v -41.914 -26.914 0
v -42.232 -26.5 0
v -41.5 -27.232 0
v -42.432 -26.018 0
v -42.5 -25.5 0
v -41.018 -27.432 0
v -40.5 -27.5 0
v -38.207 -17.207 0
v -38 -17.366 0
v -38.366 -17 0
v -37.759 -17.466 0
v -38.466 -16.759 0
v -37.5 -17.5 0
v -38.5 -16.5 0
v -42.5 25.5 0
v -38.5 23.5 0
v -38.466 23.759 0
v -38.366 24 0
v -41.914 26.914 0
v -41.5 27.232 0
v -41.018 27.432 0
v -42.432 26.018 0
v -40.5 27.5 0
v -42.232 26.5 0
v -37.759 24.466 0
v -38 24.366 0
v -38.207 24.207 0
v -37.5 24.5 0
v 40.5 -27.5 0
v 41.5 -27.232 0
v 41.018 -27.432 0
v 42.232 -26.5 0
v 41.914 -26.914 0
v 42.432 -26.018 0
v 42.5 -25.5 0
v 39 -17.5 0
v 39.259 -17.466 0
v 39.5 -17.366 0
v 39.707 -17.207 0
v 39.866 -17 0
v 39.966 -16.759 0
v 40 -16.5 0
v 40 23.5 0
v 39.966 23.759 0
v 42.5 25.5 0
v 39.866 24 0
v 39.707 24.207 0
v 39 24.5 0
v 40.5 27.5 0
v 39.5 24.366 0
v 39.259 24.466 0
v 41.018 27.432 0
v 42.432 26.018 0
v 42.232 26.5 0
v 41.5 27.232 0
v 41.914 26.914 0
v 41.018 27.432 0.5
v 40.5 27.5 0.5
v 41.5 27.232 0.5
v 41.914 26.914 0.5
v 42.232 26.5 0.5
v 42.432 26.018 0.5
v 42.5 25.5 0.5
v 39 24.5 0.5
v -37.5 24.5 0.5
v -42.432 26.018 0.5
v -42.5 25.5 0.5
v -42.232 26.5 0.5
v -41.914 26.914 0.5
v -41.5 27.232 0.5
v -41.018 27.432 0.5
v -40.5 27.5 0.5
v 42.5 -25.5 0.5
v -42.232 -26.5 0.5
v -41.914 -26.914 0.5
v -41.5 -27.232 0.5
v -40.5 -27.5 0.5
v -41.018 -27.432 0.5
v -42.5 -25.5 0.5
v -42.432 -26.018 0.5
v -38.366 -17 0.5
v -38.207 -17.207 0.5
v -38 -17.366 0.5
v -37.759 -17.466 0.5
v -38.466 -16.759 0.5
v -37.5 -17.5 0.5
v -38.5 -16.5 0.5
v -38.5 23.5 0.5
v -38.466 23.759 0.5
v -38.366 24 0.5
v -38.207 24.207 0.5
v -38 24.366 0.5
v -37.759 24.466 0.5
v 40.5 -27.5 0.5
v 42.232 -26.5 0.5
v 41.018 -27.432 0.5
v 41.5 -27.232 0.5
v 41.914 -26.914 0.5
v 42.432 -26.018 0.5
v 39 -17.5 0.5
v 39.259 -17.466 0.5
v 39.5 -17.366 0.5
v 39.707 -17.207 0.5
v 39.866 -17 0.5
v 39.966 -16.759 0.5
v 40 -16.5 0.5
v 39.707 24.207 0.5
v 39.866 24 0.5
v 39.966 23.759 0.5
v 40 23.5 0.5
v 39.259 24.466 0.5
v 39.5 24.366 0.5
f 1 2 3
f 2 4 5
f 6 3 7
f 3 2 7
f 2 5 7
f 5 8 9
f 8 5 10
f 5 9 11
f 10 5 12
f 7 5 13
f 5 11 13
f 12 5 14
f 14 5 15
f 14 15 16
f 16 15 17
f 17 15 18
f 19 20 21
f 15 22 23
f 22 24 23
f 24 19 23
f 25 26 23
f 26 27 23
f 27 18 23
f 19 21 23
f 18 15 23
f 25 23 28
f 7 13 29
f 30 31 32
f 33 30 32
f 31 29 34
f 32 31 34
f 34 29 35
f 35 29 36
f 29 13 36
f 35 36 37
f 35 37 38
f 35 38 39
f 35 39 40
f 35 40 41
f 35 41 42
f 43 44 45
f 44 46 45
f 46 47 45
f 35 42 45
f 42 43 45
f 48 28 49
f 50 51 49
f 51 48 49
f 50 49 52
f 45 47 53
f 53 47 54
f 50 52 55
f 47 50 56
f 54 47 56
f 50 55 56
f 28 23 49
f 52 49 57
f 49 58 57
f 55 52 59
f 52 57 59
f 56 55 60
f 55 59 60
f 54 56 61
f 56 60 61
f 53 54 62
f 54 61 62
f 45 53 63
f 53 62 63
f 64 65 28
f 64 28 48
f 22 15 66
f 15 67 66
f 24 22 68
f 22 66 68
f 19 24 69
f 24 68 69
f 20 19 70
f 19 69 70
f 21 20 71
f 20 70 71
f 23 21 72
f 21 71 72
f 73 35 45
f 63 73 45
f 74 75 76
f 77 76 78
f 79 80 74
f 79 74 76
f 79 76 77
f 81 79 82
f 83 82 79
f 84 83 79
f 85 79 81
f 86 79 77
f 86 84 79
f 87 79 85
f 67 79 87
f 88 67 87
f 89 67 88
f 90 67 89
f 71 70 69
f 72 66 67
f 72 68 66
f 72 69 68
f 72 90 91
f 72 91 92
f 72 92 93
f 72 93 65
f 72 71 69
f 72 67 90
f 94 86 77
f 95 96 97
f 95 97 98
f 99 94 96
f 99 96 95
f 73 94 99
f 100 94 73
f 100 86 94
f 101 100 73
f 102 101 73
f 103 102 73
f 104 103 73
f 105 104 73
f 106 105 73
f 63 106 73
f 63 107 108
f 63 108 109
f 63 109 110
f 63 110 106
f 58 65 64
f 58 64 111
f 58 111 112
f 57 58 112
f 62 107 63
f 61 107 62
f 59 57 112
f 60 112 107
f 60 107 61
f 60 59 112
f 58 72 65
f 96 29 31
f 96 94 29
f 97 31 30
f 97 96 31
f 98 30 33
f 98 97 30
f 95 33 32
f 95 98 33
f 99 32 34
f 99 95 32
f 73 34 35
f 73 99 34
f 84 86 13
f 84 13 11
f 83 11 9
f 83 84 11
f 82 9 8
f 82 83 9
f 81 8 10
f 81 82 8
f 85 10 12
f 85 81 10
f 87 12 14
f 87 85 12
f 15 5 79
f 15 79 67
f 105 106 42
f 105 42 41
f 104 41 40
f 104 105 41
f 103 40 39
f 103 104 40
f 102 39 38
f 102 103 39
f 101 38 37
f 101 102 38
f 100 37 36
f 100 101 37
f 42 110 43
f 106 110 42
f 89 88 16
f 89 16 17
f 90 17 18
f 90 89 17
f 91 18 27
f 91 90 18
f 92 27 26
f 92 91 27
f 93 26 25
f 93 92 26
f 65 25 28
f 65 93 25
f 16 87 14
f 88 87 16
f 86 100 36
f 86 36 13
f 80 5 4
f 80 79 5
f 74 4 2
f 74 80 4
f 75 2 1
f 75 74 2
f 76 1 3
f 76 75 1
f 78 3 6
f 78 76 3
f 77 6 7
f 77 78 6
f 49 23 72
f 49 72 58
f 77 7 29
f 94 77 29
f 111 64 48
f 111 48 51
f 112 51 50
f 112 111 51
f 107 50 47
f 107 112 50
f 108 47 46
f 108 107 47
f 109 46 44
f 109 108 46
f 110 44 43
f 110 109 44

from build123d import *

# Parameters (mm, degrees)
SKETCH_1_W          = 85
SKETCH_1_H          = 55
EXTRUDE_1_DEPTH     = 0.5
CUT_EXTRUDE_1_REACH = 52.624
FILLET_1_R          = 2


with BuildPart() as part:
    # 草图1 → 凸台-拉伸1 (new body)
    with BuildSketch(Plane.XY):
        Rectangle(SKETCH_1_W, SKETCH_1_H)
    extrude(amount=EXTRUDE_1_DEPTH)

    # 草图2 → 切除-拉伸1 (cut, up to next)
    with BuildSketch(Plane.XY.offset(0.5), mode=Mode.PRIVATE) as cut_extrude_1_sk1:
        with BuildLine():
            Line((-37.5, 24.5), (39, 24.5))
            ThreePointArc((39, 24.5), (39.707106781, 24.207106781), (40, 23.5))
            Line((40, 23.5), (40, -16.5))
            ThreePointArc((40, -16.5), (39.707106781, -17.207106781), (39, -17.5))
            Line((39, -17.5), (-37.5, -17.5))
            ThreePointArc((-37.5, -17.5), (-38.207106781, -17.207106781), (-38.5, -16.5))
            Line((-38.5, -16.5), (-38.5, 23.5))
            ThreePointArc((-38.5, 23.5), (-38.207106781, 24.207106781), (-37.5, 24.5))
        make_face()
    cut_extrude_1_tool1 = extrude(cut_extrude_1_sk1.sketch, amount=-CUT_EXTRUDE_1_REACH, mode=Mode.PRIVATE) & part.part
    add(cut_extrude_1_tool1.solids().sort_by_distance((0.75, 3.5, 0.5))[0], mode=Mode.SUBTRACT)

    # 圆角1
    fillet_1_edges = [part.edges().sort_by_distance(p)[0] for p in [
        (42.5, -27.5, 0.25),
        (-42.5, -27.5, 0.25),
        (-42.5, 27.5, 0.25),
        (42.5, 27.5, 0.25),
    ]]
    fillet(fillet_1_edges, radius=FILLET_1_R)


solid = part.part
